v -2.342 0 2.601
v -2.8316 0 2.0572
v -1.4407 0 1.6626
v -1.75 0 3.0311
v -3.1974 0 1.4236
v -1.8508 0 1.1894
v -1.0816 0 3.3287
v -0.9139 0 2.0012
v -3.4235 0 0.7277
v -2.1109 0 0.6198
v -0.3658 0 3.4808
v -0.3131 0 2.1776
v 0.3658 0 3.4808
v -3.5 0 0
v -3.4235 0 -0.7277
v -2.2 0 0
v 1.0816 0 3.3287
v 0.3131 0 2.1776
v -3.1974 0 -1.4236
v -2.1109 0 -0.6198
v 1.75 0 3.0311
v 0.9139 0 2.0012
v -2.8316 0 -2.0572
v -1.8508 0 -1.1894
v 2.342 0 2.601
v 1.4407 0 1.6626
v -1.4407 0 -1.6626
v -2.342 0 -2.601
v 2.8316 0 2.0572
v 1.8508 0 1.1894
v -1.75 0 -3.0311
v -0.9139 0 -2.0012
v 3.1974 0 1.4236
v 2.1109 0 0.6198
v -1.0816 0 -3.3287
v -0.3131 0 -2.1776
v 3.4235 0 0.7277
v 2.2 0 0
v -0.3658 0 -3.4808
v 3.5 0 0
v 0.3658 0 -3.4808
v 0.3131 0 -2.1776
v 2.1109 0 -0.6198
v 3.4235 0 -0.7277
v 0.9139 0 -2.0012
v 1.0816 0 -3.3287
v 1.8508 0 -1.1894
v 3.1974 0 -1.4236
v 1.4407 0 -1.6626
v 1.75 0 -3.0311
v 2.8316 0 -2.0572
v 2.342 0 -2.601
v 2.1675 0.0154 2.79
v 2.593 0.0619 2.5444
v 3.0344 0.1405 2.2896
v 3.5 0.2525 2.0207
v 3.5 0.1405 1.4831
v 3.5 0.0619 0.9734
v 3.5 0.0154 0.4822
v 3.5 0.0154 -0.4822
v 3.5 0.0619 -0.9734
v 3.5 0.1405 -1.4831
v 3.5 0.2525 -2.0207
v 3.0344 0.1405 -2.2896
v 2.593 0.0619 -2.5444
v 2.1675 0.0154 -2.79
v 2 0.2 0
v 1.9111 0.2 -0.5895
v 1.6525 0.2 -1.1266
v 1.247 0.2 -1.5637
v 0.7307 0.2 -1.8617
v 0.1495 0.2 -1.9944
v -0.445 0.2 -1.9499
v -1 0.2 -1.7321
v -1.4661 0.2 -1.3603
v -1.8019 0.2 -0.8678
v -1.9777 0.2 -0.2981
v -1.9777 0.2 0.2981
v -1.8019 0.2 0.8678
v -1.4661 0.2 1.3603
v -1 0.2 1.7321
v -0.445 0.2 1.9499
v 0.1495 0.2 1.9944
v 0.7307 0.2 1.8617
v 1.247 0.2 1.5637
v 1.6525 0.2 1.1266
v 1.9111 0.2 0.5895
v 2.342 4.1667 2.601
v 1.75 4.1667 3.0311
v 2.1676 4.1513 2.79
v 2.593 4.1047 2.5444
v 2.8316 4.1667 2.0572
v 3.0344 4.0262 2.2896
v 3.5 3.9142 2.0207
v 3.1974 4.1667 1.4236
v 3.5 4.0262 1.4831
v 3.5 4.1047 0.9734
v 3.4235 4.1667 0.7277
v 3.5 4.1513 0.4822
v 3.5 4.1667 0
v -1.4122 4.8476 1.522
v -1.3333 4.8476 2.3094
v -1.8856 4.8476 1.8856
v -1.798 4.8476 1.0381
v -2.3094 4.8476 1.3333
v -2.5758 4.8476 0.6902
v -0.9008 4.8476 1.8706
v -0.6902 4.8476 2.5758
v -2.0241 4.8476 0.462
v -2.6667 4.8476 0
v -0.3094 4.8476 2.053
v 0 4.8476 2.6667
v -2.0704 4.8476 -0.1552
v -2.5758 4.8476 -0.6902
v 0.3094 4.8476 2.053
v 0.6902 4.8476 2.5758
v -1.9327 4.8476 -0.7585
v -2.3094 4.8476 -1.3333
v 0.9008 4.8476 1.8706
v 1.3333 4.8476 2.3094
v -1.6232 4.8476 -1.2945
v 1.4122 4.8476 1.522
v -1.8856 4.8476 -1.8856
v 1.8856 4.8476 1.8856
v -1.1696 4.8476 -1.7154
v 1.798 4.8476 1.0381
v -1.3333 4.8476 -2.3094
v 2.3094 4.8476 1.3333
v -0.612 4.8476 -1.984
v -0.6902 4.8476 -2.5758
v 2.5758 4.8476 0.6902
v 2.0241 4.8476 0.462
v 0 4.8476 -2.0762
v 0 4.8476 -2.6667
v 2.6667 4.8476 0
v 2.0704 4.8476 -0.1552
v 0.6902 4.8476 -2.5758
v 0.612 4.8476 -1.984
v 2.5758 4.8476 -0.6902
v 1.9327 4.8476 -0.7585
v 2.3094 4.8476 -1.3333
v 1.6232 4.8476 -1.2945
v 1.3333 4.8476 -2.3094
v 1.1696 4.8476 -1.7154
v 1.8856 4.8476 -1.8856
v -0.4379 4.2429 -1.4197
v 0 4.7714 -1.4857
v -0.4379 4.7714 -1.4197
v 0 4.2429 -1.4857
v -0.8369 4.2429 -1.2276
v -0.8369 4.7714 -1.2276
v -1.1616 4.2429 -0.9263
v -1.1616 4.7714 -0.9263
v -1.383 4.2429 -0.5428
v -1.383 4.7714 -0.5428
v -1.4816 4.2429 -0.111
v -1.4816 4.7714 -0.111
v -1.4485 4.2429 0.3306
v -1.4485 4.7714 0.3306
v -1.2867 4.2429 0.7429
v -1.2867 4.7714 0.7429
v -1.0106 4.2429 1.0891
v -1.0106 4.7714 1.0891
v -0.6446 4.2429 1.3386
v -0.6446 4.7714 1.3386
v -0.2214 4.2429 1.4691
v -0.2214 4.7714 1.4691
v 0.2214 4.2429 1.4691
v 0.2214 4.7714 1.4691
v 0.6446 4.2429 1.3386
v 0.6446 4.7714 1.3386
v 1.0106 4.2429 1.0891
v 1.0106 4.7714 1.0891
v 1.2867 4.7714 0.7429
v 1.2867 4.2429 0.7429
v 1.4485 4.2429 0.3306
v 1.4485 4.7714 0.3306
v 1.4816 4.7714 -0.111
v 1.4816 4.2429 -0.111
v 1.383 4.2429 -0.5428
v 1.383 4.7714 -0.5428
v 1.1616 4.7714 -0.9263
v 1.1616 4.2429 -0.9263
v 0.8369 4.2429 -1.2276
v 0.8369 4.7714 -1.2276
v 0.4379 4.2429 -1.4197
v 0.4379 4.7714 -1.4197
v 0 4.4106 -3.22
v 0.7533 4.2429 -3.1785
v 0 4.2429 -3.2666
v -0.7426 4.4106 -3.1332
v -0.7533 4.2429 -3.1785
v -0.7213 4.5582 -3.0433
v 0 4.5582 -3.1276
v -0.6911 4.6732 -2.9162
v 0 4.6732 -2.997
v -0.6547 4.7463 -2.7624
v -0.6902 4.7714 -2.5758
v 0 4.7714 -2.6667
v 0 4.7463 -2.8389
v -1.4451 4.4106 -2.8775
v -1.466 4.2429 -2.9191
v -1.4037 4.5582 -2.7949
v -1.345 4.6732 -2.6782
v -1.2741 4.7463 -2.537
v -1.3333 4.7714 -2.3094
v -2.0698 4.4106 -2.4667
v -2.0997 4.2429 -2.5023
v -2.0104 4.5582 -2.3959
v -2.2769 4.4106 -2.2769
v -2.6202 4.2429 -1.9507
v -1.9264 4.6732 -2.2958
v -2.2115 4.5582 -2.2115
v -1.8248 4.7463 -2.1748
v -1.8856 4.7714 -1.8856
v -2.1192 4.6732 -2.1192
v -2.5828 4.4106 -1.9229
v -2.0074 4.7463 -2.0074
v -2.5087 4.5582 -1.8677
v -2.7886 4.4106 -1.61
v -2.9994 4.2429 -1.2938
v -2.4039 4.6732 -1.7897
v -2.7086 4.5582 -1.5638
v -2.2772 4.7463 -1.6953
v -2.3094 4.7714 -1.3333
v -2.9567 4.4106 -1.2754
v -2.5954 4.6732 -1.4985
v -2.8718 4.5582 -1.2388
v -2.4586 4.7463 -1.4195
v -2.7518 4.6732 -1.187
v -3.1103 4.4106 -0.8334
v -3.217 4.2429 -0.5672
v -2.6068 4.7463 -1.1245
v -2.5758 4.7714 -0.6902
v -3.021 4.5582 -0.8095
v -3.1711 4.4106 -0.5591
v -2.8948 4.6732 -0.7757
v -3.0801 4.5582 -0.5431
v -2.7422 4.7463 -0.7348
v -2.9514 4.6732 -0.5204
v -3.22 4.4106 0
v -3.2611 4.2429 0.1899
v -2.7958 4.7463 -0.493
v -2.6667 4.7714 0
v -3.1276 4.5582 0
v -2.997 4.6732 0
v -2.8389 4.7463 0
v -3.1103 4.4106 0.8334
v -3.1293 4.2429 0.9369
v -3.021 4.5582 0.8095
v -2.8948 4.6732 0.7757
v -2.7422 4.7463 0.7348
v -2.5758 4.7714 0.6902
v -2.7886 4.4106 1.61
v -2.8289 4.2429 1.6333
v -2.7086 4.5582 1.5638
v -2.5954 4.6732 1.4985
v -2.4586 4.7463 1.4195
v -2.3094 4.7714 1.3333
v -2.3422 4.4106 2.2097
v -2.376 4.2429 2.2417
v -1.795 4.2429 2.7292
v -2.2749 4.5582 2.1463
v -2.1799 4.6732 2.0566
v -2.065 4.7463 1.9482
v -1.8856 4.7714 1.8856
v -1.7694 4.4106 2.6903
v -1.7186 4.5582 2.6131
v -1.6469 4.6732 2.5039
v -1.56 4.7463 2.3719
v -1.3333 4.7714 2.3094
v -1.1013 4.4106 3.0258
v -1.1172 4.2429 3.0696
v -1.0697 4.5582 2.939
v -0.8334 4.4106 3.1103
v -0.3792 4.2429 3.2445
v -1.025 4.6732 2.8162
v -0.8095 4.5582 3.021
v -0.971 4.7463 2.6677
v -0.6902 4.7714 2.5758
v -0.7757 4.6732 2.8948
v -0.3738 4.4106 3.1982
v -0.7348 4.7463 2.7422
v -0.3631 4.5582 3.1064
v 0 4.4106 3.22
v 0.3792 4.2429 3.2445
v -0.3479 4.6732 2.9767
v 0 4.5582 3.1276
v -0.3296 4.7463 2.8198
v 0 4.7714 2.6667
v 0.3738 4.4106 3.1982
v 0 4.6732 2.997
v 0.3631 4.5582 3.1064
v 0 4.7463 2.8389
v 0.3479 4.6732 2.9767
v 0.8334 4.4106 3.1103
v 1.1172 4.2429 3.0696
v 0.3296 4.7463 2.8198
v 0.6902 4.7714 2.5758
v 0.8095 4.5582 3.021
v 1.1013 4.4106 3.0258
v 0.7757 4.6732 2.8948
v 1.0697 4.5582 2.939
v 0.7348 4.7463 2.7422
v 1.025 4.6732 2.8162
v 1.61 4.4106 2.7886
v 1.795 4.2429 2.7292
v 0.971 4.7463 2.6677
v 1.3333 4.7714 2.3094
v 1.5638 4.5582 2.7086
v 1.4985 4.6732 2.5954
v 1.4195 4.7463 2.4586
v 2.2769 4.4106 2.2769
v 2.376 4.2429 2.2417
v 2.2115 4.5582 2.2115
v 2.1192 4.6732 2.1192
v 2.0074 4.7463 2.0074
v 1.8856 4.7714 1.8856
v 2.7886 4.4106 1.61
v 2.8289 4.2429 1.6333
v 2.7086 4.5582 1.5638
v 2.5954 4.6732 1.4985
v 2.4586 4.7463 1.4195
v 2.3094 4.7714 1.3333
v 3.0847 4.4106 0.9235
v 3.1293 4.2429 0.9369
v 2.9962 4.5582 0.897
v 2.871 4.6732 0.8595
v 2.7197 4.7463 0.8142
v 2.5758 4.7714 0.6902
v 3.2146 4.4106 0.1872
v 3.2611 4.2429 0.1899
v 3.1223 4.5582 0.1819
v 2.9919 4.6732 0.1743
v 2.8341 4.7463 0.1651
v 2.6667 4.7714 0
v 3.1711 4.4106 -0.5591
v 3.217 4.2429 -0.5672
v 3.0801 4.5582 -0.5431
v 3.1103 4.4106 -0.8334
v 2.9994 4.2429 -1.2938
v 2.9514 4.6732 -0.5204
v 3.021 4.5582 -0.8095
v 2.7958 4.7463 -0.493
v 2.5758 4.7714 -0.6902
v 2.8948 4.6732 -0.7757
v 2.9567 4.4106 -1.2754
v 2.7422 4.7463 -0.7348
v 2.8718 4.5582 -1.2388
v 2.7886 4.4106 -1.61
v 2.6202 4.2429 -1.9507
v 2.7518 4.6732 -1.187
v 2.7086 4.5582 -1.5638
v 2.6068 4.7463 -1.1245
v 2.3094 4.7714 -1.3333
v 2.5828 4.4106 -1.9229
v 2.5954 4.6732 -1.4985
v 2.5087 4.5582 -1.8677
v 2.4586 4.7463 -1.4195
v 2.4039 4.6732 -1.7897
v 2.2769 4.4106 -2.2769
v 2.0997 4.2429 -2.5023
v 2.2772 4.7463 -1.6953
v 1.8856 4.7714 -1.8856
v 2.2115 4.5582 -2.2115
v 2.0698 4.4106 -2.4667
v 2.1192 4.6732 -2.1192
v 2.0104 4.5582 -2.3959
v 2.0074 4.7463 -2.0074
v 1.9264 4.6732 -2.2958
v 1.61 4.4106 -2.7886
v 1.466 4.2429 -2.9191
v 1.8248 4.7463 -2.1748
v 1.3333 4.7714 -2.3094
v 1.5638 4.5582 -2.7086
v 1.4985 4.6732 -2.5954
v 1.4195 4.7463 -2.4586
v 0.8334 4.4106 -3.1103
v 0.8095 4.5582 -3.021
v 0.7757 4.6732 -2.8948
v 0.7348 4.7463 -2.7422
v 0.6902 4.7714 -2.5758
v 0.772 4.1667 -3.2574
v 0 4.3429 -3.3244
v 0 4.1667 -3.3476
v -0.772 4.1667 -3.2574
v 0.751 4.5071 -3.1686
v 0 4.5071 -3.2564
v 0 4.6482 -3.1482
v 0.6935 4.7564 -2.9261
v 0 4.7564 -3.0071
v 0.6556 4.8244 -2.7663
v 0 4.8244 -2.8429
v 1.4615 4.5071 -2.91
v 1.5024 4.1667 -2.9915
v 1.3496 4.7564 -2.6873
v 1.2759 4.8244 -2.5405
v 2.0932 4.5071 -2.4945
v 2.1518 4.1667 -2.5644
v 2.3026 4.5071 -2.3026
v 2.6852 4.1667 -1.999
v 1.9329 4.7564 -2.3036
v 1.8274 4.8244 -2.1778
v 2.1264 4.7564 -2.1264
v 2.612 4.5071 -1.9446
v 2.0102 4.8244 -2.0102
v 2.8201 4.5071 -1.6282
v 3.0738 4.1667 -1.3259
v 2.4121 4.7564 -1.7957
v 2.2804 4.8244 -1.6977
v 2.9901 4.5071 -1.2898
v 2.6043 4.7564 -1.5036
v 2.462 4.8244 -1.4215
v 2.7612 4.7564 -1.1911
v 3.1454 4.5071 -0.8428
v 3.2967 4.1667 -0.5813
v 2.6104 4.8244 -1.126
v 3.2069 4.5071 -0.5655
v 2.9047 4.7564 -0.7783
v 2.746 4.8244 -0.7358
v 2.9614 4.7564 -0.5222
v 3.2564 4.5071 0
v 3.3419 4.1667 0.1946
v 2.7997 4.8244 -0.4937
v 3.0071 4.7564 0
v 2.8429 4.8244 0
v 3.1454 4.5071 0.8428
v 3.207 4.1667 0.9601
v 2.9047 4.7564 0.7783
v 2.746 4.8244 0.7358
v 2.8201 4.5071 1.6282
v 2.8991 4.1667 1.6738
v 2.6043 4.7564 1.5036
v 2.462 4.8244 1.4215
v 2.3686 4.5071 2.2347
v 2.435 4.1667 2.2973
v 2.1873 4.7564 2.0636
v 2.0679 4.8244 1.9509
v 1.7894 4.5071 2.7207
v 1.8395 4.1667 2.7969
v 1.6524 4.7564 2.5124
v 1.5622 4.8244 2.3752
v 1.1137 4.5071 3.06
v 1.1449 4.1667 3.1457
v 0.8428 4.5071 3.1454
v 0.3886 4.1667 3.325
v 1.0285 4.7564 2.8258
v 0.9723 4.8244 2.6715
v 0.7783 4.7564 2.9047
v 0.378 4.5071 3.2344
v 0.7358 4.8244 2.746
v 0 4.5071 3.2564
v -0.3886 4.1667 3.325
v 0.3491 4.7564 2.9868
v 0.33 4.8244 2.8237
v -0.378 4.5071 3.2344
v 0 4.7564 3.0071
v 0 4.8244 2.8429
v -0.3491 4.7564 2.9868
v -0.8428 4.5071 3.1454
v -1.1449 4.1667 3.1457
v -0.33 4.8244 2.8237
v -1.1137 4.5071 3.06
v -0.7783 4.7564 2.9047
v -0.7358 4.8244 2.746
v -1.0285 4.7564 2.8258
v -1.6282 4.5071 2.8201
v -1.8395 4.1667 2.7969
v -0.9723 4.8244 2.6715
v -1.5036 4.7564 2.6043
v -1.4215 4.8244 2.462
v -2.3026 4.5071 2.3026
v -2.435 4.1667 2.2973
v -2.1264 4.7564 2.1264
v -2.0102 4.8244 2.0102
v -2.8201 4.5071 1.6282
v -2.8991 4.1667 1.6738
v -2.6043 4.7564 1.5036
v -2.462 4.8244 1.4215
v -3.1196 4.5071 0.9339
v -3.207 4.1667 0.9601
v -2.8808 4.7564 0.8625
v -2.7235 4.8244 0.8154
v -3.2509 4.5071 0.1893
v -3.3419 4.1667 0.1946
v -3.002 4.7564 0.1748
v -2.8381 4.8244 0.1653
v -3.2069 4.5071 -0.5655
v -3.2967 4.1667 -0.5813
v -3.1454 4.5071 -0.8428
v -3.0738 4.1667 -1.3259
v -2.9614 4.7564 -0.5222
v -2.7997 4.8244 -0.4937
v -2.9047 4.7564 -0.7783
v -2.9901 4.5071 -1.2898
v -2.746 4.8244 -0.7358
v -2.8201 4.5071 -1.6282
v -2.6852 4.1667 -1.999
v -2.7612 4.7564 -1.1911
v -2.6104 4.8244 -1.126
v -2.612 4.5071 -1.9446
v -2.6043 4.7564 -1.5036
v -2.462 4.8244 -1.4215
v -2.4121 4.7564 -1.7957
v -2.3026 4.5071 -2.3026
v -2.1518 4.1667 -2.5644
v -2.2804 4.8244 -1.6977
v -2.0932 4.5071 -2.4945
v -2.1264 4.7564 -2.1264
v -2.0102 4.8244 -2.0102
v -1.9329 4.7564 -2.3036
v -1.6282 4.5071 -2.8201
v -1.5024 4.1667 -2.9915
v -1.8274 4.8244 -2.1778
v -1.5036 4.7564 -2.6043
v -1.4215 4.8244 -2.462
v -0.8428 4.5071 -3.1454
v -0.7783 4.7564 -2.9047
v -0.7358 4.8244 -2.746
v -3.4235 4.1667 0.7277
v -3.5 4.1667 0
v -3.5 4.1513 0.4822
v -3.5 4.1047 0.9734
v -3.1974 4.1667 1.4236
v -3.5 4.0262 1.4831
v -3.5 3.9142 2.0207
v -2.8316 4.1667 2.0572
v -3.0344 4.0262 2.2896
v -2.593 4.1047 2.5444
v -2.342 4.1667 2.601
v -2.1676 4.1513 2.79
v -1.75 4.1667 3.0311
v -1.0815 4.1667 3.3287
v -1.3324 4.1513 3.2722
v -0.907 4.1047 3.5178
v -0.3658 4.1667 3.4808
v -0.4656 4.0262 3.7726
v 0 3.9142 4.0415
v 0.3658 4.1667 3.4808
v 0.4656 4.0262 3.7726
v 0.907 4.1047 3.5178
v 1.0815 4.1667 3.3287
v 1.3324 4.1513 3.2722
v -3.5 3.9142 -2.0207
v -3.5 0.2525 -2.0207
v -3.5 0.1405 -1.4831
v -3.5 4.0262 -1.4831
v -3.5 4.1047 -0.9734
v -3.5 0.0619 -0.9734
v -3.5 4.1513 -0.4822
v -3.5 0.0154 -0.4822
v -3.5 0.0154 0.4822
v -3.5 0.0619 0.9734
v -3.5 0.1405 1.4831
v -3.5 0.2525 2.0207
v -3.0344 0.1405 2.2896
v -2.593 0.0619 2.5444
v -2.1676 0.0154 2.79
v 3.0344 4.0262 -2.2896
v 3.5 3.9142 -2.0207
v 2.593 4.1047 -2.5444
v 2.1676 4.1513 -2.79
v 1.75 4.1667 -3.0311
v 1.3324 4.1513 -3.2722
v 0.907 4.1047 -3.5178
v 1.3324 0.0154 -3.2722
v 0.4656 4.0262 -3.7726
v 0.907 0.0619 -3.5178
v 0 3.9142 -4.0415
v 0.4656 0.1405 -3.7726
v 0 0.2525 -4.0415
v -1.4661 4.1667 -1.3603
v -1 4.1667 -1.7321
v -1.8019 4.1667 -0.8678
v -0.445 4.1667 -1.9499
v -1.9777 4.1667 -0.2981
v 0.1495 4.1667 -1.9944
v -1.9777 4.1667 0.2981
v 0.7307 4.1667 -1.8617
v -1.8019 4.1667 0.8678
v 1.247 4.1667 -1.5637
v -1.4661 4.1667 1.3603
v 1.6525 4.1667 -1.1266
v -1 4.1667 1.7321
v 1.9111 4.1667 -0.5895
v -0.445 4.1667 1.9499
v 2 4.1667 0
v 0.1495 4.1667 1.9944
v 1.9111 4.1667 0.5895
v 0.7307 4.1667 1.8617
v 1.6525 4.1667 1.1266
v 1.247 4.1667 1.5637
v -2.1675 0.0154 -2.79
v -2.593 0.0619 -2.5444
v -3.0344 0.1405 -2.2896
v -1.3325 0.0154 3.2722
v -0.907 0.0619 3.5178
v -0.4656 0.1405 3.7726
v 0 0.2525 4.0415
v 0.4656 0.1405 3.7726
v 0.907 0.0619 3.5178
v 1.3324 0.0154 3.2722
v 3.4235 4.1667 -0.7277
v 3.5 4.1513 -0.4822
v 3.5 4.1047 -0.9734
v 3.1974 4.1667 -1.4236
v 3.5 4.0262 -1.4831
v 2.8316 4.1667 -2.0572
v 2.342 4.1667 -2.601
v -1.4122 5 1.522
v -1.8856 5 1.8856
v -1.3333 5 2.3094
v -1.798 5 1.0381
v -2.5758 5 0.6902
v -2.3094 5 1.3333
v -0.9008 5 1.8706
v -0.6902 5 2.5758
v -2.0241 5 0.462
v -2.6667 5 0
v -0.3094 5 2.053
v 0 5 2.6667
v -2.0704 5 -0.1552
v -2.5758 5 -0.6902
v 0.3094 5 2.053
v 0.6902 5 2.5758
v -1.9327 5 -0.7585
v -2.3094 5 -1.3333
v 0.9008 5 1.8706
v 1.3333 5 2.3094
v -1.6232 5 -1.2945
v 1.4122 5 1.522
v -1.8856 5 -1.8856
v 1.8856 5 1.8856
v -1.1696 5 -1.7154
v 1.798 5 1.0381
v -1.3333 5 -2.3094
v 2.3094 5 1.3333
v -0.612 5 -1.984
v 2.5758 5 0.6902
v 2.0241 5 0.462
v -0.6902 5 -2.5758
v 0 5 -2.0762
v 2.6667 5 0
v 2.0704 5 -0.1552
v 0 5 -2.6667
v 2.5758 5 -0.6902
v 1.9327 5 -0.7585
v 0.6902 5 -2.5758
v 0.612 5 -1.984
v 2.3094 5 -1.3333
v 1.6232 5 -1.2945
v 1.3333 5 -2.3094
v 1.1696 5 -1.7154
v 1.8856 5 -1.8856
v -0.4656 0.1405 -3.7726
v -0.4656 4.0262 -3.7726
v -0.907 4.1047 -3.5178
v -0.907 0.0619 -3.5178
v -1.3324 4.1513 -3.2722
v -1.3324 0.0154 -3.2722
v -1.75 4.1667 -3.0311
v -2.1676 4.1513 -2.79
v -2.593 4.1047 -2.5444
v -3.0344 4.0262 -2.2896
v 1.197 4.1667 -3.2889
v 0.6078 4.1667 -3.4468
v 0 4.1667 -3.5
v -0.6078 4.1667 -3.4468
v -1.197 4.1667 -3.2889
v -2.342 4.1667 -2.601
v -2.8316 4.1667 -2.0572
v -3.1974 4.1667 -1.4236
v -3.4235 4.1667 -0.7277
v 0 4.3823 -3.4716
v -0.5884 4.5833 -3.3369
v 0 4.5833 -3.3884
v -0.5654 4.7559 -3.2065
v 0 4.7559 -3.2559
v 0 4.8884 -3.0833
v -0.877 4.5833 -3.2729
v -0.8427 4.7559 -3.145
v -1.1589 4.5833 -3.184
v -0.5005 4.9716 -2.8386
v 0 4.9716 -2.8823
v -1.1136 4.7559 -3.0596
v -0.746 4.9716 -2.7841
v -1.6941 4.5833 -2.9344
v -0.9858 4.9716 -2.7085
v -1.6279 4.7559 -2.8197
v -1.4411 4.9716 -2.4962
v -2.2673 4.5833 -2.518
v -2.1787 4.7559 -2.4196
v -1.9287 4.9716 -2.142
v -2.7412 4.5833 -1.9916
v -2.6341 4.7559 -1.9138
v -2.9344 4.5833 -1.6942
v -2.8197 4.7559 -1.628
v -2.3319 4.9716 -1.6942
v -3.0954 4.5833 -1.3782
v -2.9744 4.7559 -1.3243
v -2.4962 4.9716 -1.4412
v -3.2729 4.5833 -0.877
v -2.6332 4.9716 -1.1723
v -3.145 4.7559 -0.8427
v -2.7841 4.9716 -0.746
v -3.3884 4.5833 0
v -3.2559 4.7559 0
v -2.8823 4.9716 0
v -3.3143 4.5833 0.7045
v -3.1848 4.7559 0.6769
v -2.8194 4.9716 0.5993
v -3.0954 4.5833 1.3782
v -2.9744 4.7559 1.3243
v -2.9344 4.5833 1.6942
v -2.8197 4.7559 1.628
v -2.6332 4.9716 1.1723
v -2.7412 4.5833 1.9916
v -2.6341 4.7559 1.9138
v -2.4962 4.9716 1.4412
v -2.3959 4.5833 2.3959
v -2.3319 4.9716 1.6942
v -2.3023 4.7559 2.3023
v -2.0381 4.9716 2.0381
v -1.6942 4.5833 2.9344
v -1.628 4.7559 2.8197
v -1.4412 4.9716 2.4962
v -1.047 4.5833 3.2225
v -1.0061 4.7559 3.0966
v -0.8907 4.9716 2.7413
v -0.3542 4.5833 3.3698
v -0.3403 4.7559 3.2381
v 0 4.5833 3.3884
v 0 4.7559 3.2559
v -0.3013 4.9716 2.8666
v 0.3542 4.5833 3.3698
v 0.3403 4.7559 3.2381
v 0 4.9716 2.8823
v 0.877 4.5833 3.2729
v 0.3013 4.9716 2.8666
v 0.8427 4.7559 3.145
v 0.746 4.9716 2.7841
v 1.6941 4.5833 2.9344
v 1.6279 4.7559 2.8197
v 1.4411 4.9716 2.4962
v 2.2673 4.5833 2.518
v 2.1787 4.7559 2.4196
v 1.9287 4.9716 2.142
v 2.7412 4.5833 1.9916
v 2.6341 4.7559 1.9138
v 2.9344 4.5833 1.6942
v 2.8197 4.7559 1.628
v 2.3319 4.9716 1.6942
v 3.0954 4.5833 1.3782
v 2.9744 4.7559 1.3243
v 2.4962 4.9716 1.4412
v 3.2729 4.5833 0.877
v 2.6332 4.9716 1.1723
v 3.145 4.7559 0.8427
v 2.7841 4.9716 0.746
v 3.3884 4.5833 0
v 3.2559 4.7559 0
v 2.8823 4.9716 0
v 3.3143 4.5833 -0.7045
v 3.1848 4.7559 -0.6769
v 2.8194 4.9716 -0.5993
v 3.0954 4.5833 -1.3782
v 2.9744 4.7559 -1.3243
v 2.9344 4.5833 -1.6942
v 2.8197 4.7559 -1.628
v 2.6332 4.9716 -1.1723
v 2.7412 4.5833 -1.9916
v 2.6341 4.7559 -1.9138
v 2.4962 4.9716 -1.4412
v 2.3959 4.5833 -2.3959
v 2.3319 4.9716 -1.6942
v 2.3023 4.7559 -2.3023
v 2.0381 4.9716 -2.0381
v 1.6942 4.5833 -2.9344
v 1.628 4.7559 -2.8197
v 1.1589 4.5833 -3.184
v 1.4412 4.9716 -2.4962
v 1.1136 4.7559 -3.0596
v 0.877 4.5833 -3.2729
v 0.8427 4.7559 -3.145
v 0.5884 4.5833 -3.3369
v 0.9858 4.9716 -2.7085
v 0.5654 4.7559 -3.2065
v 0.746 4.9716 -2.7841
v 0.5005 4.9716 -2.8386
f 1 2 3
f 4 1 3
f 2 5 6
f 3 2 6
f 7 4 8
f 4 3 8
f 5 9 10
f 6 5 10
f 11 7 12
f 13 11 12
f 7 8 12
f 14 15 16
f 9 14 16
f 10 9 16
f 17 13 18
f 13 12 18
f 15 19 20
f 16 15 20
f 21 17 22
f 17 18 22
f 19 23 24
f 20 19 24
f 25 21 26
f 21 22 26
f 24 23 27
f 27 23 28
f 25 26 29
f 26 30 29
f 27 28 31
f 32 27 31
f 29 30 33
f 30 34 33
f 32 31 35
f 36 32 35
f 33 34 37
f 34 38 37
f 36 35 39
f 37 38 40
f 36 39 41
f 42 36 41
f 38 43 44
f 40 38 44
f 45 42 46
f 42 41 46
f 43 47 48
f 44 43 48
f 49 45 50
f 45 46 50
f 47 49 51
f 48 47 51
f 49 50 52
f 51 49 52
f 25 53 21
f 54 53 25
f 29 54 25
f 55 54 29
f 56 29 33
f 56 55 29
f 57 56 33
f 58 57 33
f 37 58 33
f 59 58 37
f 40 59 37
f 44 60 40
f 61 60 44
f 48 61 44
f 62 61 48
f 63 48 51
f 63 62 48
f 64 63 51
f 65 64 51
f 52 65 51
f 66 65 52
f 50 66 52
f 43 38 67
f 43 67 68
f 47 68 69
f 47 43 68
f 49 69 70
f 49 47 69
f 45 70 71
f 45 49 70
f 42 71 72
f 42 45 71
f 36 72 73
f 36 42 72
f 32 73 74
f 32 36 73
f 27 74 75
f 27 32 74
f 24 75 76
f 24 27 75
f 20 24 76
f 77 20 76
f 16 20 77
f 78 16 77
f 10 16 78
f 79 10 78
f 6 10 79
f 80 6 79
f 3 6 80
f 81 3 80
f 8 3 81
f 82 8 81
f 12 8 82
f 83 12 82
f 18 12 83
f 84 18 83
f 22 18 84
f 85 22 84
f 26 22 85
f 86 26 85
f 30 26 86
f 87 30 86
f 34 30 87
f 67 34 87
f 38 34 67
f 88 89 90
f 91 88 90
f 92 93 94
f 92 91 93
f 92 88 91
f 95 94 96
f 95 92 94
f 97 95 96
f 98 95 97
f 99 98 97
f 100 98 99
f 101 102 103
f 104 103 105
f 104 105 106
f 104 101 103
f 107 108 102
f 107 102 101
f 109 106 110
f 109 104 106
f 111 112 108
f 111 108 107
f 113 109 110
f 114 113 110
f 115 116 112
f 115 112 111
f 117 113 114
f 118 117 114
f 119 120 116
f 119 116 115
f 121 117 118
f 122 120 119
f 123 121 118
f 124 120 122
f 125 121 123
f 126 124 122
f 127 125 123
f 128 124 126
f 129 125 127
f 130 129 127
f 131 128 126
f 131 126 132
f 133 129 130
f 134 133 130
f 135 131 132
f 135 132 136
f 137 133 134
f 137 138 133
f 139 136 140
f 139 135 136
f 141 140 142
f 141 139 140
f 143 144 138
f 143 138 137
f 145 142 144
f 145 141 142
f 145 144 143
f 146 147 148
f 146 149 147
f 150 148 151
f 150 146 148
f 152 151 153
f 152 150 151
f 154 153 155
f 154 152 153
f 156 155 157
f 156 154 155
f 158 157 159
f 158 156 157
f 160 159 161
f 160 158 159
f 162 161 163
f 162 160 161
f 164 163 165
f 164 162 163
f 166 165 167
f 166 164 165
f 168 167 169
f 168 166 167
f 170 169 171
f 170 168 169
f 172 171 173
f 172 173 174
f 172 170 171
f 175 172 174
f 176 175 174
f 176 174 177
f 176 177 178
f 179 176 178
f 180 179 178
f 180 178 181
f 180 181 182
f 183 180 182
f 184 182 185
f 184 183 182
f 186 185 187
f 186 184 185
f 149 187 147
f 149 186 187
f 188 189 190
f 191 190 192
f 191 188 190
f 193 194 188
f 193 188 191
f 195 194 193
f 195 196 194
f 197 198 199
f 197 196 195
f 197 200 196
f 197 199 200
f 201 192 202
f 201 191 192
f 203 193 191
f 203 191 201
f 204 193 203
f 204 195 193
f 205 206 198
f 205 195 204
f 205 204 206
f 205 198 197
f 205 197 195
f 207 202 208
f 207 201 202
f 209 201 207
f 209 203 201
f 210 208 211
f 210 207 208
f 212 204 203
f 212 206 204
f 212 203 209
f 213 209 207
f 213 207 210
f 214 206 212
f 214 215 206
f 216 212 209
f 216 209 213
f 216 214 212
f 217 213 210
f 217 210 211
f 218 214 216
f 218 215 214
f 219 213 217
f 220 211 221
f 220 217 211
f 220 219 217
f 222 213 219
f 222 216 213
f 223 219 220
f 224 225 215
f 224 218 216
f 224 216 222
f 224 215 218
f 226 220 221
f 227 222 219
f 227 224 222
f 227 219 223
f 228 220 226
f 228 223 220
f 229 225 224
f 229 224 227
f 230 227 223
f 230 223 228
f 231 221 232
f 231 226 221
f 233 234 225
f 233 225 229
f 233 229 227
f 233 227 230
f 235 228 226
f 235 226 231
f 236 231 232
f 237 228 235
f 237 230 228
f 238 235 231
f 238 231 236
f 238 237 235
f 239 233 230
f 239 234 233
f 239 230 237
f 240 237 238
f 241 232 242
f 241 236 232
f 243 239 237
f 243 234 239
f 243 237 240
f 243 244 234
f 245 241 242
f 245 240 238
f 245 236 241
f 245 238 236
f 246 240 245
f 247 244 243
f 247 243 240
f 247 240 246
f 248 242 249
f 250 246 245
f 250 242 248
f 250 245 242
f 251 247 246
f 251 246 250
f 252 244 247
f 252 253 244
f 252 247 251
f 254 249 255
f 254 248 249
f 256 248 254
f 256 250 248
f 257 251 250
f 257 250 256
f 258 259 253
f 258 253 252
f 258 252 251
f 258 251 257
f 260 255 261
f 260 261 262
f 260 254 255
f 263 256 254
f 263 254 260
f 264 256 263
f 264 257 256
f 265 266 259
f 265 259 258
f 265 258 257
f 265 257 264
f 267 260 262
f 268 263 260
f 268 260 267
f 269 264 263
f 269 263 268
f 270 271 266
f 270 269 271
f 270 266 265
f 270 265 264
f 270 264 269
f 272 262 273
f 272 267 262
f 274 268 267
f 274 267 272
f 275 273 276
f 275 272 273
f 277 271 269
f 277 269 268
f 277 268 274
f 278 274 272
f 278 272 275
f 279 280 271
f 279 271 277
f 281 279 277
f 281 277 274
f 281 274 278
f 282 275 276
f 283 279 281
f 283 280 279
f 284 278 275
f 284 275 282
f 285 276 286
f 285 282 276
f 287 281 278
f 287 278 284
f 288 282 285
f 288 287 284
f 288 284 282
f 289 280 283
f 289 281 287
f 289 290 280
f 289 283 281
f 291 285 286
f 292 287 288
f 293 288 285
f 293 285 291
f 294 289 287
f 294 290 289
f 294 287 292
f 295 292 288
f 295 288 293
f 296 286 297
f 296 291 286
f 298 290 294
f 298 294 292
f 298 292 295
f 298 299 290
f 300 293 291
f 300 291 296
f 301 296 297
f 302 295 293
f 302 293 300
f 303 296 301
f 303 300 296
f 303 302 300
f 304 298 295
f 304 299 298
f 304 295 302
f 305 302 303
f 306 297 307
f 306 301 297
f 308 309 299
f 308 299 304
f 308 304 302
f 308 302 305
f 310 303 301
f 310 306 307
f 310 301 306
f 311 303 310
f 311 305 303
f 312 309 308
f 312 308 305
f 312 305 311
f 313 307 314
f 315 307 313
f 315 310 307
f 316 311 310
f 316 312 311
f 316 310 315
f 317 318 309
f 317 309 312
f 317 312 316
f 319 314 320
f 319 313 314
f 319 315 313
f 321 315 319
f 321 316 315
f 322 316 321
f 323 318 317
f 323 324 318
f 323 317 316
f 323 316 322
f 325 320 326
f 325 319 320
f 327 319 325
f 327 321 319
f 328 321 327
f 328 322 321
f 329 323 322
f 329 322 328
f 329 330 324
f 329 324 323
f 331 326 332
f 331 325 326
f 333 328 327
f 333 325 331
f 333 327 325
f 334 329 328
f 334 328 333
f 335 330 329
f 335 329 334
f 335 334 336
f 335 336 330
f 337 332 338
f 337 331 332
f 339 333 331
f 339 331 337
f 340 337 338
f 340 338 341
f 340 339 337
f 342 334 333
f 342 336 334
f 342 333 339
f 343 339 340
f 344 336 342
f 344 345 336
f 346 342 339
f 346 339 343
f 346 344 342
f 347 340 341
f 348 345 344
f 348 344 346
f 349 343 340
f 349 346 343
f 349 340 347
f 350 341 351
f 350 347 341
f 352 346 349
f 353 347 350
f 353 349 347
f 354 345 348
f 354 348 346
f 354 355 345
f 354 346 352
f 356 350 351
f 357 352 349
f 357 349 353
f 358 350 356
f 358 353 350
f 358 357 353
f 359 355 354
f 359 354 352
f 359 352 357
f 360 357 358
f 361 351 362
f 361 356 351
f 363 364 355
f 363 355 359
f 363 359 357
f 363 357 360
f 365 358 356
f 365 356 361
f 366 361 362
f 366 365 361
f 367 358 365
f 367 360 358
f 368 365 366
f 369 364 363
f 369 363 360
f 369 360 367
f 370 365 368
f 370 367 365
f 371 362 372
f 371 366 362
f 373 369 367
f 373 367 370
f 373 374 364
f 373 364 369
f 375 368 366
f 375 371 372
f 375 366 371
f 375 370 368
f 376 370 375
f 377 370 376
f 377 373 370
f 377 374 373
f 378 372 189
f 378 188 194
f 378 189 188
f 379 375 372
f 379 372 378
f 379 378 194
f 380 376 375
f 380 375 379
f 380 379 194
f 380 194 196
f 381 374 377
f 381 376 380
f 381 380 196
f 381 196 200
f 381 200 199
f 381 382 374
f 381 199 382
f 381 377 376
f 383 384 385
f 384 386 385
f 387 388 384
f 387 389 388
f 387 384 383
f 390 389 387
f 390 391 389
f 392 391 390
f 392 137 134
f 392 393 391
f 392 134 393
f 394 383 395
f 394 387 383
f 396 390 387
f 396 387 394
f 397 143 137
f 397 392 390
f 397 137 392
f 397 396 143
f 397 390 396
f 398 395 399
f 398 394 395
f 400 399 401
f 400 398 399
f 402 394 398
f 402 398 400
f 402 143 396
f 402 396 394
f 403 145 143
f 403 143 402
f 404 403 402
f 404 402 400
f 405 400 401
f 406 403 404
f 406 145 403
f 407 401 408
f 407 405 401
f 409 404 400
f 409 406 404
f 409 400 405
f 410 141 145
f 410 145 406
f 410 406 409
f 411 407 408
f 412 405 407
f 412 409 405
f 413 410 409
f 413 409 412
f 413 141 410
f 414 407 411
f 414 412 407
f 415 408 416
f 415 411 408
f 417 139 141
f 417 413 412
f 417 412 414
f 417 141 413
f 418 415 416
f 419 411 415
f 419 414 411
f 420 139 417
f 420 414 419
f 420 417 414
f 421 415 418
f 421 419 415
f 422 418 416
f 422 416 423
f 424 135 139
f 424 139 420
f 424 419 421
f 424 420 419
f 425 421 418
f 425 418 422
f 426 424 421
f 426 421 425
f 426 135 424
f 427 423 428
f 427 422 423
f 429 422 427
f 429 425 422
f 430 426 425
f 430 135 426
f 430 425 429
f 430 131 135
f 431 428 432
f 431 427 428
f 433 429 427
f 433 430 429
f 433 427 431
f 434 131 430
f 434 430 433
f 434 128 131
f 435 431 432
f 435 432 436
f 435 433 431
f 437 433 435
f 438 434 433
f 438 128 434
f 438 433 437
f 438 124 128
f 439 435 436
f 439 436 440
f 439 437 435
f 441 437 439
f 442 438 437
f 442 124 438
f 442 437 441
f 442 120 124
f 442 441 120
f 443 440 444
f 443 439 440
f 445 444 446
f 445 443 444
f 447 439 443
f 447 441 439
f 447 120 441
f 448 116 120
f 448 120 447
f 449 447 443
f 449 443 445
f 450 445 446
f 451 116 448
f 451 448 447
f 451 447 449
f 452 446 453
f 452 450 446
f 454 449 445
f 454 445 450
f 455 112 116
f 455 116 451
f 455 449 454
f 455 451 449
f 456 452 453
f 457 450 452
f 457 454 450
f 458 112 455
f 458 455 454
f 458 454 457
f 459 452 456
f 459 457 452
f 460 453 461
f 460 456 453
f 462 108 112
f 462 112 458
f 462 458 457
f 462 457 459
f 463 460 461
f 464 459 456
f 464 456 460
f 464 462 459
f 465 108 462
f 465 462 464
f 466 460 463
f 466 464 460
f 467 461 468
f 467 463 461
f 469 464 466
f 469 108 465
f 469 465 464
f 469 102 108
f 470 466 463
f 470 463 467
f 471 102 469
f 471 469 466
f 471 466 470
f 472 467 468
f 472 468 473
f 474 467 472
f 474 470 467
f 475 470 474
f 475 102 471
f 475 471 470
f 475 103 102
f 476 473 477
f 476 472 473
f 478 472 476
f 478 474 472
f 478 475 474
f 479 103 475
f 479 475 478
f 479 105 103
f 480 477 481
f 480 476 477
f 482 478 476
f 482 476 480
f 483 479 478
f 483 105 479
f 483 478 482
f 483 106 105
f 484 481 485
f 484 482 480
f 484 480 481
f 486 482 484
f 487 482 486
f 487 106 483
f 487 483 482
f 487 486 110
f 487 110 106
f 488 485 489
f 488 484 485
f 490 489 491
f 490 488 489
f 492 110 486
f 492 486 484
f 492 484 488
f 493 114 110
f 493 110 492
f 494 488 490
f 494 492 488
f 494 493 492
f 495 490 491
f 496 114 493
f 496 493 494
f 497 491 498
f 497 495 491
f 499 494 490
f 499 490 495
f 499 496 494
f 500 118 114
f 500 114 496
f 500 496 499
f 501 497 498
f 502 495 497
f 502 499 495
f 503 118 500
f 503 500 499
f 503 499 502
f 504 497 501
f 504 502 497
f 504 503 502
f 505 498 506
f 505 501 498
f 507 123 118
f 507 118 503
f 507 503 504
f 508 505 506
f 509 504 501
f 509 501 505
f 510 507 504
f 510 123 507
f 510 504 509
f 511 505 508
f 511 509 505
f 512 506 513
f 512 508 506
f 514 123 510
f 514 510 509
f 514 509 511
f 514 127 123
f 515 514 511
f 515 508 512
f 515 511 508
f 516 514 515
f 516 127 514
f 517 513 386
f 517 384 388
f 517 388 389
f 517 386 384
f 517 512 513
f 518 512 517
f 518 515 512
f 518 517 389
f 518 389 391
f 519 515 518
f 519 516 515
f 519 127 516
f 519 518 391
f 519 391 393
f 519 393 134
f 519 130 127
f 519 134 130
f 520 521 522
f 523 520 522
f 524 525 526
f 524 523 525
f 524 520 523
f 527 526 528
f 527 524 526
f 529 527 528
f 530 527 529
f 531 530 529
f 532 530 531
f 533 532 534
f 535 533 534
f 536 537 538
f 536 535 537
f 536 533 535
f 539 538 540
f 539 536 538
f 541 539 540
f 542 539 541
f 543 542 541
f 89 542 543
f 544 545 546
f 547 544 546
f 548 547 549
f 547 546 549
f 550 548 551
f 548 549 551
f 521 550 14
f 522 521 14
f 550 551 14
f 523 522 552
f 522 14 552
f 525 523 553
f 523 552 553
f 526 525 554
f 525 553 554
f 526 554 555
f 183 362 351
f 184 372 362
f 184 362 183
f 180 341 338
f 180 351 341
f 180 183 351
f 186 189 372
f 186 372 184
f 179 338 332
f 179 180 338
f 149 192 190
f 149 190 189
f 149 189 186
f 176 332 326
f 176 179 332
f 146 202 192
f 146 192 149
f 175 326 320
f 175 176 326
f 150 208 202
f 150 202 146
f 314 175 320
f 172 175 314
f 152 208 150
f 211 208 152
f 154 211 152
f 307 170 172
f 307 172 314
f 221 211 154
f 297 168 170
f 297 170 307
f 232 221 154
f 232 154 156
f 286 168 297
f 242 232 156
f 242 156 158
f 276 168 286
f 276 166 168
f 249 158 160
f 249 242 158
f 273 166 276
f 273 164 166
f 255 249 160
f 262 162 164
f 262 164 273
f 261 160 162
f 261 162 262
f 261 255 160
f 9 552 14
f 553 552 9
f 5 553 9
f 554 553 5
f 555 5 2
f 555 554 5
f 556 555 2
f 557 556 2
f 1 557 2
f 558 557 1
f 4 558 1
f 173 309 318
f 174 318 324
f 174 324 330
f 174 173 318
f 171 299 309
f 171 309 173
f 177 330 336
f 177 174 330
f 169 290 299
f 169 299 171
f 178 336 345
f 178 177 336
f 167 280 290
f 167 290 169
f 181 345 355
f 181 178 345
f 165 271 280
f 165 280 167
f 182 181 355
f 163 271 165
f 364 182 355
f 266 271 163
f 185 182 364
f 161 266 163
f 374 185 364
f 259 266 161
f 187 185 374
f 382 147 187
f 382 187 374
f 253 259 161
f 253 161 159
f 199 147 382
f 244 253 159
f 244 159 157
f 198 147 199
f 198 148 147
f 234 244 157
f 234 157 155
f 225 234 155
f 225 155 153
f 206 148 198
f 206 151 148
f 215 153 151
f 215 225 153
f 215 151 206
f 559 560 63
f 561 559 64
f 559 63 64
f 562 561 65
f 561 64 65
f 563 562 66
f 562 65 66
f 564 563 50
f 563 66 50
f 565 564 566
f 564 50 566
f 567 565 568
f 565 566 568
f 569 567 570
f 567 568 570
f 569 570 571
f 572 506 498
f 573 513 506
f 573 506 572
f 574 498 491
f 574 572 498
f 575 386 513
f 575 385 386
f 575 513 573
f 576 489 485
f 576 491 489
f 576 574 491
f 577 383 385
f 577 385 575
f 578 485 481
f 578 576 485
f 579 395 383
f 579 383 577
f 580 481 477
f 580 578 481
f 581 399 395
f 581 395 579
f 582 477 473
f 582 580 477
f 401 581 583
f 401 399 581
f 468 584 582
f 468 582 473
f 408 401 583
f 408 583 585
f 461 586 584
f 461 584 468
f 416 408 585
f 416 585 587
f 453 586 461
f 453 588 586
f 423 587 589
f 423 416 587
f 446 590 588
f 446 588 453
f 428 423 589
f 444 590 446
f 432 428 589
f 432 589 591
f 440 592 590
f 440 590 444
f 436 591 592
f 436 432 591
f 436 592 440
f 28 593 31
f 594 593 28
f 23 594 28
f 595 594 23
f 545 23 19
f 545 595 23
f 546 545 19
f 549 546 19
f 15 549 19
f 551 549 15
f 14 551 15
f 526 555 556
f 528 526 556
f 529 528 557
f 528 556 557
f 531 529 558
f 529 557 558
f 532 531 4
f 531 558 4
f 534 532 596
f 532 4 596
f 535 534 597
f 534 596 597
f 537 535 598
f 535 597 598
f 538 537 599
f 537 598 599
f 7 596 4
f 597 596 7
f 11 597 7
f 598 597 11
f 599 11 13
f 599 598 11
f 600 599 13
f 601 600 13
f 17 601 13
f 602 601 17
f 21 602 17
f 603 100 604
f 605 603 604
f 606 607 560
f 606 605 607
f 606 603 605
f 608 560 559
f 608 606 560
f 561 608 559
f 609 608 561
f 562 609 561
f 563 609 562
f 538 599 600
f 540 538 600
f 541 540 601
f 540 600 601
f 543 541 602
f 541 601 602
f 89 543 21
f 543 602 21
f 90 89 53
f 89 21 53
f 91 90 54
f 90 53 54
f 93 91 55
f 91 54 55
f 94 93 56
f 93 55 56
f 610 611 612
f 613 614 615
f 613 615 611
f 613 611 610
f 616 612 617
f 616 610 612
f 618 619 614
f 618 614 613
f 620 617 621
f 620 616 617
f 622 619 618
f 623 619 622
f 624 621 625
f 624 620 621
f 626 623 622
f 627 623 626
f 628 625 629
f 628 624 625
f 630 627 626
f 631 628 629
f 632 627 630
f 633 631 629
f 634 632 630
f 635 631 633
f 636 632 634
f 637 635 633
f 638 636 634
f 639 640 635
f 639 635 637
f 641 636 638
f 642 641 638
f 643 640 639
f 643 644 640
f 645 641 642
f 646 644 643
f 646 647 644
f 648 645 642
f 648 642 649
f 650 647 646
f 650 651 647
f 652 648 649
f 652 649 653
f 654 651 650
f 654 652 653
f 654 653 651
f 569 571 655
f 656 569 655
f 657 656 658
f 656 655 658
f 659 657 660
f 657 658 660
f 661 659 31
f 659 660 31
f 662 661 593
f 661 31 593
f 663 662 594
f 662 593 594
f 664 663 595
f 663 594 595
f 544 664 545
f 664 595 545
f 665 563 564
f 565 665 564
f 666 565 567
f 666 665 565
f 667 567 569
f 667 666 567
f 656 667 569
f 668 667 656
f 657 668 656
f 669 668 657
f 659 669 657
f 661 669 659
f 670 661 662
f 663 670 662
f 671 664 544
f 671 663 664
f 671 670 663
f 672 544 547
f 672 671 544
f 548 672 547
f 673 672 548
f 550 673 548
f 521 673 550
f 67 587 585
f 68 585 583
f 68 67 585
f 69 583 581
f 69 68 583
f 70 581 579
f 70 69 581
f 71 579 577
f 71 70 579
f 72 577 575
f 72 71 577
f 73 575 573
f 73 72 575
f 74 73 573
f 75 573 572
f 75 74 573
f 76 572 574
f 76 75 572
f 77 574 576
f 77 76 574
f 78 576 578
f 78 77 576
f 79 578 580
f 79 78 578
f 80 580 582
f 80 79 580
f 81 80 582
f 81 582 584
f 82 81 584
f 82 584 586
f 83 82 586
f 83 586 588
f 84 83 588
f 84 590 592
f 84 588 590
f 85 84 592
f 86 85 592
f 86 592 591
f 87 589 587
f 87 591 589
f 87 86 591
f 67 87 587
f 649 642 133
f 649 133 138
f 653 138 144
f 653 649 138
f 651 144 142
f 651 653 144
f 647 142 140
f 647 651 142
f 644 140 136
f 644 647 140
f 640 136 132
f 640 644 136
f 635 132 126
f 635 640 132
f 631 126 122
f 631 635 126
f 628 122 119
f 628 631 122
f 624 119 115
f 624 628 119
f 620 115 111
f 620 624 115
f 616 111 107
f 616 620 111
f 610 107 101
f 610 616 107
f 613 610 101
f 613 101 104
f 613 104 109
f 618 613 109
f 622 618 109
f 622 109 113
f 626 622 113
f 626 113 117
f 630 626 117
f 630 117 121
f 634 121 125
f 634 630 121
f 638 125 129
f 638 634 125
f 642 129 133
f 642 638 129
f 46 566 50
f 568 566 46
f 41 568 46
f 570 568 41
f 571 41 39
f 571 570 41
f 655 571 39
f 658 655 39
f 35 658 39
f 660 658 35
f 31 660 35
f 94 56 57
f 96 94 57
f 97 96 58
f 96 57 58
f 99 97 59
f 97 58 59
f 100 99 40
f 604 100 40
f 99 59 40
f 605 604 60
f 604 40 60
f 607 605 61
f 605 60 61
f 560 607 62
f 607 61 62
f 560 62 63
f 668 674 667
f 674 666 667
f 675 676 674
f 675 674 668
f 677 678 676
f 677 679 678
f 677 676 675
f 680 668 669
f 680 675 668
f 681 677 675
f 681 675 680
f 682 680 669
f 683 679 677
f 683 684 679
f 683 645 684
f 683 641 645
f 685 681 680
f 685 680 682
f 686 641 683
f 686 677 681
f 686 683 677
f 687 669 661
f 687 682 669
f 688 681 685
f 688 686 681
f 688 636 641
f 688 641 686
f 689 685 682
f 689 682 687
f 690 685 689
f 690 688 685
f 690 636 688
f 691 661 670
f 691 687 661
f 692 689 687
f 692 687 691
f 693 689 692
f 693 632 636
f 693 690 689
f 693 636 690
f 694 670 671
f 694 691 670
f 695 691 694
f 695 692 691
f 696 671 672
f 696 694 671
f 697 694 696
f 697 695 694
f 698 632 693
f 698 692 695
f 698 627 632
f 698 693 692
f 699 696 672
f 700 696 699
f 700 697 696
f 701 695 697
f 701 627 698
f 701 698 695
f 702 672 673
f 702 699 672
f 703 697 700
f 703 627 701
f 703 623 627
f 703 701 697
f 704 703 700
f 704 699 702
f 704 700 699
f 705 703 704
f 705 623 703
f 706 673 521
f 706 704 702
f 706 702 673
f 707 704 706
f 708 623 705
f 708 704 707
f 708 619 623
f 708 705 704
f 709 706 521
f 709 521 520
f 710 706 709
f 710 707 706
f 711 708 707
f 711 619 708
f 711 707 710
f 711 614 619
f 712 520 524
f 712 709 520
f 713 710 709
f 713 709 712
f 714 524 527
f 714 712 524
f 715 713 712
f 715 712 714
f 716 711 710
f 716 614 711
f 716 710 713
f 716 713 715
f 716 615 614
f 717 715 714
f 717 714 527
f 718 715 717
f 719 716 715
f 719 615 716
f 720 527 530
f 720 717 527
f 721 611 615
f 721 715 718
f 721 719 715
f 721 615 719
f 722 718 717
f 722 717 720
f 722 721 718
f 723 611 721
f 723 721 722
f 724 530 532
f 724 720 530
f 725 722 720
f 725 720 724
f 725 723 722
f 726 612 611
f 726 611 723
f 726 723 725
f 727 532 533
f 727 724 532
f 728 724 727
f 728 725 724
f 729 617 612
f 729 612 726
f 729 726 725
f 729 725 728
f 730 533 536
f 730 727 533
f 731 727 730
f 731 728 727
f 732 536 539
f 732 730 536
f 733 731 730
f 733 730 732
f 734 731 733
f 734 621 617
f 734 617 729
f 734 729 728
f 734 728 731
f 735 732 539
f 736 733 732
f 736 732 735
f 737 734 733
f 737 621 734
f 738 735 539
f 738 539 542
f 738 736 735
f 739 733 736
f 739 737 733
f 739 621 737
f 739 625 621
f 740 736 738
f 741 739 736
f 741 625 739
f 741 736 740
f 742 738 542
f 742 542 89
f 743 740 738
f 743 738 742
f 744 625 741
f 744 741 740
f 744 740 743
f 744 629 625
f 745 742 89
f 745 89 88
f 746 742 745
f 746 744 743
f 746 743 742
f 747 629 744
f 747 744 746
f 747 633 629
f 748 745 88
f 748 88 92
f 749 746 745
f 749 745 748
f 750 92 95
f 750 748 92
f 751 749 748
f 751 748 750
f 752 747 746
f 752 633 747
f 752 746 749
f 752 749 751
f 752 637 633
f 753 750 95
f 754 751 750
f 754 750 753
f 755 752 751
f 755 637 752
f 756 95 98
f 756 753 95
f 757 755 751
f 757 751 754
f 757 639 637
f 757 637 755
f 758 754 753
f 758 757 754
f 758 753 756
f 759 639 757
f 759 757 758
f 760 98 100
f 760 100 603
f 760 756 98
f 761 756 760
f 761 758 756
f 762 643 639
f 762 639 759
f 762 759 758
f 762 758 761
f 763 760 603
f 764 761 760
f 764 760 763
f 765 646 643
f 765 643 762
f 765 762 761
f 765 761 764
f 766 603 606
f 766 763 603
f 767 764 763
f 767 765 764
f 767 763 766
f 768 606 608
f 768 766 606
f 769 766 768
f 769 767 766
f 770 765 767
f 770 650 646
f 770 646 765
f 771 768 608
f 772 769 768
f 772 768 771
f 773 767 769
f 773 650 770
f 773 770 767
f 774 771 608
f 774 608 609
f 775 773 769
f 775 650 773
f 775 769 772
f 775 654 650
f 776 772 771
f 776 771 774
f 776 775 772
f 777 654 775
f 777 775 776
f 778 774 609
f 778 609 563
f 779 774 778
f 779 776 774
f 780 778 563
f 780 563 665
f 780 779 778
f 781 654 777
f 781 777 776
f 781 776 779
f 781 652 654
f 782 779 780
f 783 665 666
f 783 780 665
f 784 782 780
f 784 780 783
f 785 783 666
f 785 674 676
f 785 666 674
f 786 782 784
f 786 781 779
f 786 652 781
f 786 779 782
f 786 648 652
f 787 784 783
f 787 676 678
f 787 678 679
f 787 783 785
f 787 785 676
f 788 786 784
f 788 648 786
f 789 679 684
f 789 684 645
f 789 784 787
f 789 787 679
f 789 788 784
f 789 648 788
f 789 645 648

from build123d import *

# Parameters (mm, degrees)
SKETCH1_R      = 2
EXTRUDE1_DEPTH = 5
CHAMFER1_SIZE  = 0.2


with BuildPart() as part:
    # Sketch1 → Extrude1 (new body)
    with BuildSketch(Plane(origin=(0, 0, 0), x_dir=(1, 0, 0), z_dir=(0, 1, 0))):
        Polygon((0, 4.041451884), (-3.5, 2.020725942), (-3.5, -2.020725942), (0, -4.041451884), (3.5, -2.020725942), (3.5, 2.020725942), align=None)
        Circle(SKETCH1_R, mode=Mode.SUBTRACT)
    extrude(amount=EXTRUDE1_DEPTH)

    # Chamfer1
    chamfer1_edges = [part.edges().sort_by_distance(p)[0] for p in [
        (-2, 0, 0),
    ]]
    chamfer(chamfer1_edges, length=CHAMFER1_SIZE)

    # Sketch5 → Cut-Revolve3 (revolve, cut)
    with BuildSketch(Plane(origin=(0, 0, 0), x_dir=(0, 0, -1), z_dir=(1, 0, 0))):
        with BuildLine():
            Line((0, 0), (3.5, 0))
            Line((3.5, 0), (4.041451884, 0.25248316))
            Line((4.041451884, 0.25248316), (4.041451884, 3.914183506))
            Line((4.041451884, 3.914183506), (3.5, 4.166666667))
            ThreePointArc((3.5, 4.166666667), (3.255922318, 4.755922318), (2.666666667, 5))
            Line((2.666666667, 5), (2.666666667, 6.27))
            Line((2.666666667, 6.27), (5.311451884, 6.27))
            Line((5.311451884, 6.27), (5.311451884, -1.27))
            Line((5.311451884, -1.27), (0, -1.27))
            Line((0, -1.27), (0, 0))
        make_face()
    revolve(axis=Axis((0, 0, 0), (0, 1, 0)), mode=Mode.SUBTRACT)

    # Sketch6 → Cut-Revolve4 (revolve, cut)
    with BuildSketch(Plane(origin=(0, 0, 0), x_dir=(0, 0, -1), z_dir=(1, 0, 0))):
        with BuildLine():
            Line((0, 4.166666667), (3.3476, 4.166666667))
            ThreePointArc((3.3476, 4.166666667), (3.148159244, 4.648159244), (2.666666667, 4.8476))
            Line((2.666666667, 4.8476), (2.0762, 4.8476))
            Line((2.0762, 4.8476), (2.0762, 6.27))
            Line((2.0762, 6.27), (0, 6.27))
            Line((0, 6.27), (0, 4.166666667))
        make_face()
    revolve(axis=Axis((0, 6.27, 0), (0, -1, 0)), mode=Mode.SUBTRACT)


with BuildPart() as body_2:
    # Sketch7 → Revolve2 (revolve)
    with BuildSketch(Plane(origin=(0, 0, 0), x_dir=(0, 0, -1), z_dir=(1, 0, 0))):
        with BuildLine():
            Line((1.485733333, 4.242866667), (3.266579964, 4.242866667))
            ThreePointArc((3.266579964, 4.242866667), (3.066430175, 4.620419399), (2.666666667, 4.7714))
            Line((2.666666667, 4.7714), (1.485733333, 4.7714))
            Line((1.485733333, 4.7714), (1.485733333, 4.242866667))
        make_face()
    revolve(axis=Axis((0, 4.242866667, 0), (0, 1, 0)))


solid = Compound([part.part, body_2.part])
